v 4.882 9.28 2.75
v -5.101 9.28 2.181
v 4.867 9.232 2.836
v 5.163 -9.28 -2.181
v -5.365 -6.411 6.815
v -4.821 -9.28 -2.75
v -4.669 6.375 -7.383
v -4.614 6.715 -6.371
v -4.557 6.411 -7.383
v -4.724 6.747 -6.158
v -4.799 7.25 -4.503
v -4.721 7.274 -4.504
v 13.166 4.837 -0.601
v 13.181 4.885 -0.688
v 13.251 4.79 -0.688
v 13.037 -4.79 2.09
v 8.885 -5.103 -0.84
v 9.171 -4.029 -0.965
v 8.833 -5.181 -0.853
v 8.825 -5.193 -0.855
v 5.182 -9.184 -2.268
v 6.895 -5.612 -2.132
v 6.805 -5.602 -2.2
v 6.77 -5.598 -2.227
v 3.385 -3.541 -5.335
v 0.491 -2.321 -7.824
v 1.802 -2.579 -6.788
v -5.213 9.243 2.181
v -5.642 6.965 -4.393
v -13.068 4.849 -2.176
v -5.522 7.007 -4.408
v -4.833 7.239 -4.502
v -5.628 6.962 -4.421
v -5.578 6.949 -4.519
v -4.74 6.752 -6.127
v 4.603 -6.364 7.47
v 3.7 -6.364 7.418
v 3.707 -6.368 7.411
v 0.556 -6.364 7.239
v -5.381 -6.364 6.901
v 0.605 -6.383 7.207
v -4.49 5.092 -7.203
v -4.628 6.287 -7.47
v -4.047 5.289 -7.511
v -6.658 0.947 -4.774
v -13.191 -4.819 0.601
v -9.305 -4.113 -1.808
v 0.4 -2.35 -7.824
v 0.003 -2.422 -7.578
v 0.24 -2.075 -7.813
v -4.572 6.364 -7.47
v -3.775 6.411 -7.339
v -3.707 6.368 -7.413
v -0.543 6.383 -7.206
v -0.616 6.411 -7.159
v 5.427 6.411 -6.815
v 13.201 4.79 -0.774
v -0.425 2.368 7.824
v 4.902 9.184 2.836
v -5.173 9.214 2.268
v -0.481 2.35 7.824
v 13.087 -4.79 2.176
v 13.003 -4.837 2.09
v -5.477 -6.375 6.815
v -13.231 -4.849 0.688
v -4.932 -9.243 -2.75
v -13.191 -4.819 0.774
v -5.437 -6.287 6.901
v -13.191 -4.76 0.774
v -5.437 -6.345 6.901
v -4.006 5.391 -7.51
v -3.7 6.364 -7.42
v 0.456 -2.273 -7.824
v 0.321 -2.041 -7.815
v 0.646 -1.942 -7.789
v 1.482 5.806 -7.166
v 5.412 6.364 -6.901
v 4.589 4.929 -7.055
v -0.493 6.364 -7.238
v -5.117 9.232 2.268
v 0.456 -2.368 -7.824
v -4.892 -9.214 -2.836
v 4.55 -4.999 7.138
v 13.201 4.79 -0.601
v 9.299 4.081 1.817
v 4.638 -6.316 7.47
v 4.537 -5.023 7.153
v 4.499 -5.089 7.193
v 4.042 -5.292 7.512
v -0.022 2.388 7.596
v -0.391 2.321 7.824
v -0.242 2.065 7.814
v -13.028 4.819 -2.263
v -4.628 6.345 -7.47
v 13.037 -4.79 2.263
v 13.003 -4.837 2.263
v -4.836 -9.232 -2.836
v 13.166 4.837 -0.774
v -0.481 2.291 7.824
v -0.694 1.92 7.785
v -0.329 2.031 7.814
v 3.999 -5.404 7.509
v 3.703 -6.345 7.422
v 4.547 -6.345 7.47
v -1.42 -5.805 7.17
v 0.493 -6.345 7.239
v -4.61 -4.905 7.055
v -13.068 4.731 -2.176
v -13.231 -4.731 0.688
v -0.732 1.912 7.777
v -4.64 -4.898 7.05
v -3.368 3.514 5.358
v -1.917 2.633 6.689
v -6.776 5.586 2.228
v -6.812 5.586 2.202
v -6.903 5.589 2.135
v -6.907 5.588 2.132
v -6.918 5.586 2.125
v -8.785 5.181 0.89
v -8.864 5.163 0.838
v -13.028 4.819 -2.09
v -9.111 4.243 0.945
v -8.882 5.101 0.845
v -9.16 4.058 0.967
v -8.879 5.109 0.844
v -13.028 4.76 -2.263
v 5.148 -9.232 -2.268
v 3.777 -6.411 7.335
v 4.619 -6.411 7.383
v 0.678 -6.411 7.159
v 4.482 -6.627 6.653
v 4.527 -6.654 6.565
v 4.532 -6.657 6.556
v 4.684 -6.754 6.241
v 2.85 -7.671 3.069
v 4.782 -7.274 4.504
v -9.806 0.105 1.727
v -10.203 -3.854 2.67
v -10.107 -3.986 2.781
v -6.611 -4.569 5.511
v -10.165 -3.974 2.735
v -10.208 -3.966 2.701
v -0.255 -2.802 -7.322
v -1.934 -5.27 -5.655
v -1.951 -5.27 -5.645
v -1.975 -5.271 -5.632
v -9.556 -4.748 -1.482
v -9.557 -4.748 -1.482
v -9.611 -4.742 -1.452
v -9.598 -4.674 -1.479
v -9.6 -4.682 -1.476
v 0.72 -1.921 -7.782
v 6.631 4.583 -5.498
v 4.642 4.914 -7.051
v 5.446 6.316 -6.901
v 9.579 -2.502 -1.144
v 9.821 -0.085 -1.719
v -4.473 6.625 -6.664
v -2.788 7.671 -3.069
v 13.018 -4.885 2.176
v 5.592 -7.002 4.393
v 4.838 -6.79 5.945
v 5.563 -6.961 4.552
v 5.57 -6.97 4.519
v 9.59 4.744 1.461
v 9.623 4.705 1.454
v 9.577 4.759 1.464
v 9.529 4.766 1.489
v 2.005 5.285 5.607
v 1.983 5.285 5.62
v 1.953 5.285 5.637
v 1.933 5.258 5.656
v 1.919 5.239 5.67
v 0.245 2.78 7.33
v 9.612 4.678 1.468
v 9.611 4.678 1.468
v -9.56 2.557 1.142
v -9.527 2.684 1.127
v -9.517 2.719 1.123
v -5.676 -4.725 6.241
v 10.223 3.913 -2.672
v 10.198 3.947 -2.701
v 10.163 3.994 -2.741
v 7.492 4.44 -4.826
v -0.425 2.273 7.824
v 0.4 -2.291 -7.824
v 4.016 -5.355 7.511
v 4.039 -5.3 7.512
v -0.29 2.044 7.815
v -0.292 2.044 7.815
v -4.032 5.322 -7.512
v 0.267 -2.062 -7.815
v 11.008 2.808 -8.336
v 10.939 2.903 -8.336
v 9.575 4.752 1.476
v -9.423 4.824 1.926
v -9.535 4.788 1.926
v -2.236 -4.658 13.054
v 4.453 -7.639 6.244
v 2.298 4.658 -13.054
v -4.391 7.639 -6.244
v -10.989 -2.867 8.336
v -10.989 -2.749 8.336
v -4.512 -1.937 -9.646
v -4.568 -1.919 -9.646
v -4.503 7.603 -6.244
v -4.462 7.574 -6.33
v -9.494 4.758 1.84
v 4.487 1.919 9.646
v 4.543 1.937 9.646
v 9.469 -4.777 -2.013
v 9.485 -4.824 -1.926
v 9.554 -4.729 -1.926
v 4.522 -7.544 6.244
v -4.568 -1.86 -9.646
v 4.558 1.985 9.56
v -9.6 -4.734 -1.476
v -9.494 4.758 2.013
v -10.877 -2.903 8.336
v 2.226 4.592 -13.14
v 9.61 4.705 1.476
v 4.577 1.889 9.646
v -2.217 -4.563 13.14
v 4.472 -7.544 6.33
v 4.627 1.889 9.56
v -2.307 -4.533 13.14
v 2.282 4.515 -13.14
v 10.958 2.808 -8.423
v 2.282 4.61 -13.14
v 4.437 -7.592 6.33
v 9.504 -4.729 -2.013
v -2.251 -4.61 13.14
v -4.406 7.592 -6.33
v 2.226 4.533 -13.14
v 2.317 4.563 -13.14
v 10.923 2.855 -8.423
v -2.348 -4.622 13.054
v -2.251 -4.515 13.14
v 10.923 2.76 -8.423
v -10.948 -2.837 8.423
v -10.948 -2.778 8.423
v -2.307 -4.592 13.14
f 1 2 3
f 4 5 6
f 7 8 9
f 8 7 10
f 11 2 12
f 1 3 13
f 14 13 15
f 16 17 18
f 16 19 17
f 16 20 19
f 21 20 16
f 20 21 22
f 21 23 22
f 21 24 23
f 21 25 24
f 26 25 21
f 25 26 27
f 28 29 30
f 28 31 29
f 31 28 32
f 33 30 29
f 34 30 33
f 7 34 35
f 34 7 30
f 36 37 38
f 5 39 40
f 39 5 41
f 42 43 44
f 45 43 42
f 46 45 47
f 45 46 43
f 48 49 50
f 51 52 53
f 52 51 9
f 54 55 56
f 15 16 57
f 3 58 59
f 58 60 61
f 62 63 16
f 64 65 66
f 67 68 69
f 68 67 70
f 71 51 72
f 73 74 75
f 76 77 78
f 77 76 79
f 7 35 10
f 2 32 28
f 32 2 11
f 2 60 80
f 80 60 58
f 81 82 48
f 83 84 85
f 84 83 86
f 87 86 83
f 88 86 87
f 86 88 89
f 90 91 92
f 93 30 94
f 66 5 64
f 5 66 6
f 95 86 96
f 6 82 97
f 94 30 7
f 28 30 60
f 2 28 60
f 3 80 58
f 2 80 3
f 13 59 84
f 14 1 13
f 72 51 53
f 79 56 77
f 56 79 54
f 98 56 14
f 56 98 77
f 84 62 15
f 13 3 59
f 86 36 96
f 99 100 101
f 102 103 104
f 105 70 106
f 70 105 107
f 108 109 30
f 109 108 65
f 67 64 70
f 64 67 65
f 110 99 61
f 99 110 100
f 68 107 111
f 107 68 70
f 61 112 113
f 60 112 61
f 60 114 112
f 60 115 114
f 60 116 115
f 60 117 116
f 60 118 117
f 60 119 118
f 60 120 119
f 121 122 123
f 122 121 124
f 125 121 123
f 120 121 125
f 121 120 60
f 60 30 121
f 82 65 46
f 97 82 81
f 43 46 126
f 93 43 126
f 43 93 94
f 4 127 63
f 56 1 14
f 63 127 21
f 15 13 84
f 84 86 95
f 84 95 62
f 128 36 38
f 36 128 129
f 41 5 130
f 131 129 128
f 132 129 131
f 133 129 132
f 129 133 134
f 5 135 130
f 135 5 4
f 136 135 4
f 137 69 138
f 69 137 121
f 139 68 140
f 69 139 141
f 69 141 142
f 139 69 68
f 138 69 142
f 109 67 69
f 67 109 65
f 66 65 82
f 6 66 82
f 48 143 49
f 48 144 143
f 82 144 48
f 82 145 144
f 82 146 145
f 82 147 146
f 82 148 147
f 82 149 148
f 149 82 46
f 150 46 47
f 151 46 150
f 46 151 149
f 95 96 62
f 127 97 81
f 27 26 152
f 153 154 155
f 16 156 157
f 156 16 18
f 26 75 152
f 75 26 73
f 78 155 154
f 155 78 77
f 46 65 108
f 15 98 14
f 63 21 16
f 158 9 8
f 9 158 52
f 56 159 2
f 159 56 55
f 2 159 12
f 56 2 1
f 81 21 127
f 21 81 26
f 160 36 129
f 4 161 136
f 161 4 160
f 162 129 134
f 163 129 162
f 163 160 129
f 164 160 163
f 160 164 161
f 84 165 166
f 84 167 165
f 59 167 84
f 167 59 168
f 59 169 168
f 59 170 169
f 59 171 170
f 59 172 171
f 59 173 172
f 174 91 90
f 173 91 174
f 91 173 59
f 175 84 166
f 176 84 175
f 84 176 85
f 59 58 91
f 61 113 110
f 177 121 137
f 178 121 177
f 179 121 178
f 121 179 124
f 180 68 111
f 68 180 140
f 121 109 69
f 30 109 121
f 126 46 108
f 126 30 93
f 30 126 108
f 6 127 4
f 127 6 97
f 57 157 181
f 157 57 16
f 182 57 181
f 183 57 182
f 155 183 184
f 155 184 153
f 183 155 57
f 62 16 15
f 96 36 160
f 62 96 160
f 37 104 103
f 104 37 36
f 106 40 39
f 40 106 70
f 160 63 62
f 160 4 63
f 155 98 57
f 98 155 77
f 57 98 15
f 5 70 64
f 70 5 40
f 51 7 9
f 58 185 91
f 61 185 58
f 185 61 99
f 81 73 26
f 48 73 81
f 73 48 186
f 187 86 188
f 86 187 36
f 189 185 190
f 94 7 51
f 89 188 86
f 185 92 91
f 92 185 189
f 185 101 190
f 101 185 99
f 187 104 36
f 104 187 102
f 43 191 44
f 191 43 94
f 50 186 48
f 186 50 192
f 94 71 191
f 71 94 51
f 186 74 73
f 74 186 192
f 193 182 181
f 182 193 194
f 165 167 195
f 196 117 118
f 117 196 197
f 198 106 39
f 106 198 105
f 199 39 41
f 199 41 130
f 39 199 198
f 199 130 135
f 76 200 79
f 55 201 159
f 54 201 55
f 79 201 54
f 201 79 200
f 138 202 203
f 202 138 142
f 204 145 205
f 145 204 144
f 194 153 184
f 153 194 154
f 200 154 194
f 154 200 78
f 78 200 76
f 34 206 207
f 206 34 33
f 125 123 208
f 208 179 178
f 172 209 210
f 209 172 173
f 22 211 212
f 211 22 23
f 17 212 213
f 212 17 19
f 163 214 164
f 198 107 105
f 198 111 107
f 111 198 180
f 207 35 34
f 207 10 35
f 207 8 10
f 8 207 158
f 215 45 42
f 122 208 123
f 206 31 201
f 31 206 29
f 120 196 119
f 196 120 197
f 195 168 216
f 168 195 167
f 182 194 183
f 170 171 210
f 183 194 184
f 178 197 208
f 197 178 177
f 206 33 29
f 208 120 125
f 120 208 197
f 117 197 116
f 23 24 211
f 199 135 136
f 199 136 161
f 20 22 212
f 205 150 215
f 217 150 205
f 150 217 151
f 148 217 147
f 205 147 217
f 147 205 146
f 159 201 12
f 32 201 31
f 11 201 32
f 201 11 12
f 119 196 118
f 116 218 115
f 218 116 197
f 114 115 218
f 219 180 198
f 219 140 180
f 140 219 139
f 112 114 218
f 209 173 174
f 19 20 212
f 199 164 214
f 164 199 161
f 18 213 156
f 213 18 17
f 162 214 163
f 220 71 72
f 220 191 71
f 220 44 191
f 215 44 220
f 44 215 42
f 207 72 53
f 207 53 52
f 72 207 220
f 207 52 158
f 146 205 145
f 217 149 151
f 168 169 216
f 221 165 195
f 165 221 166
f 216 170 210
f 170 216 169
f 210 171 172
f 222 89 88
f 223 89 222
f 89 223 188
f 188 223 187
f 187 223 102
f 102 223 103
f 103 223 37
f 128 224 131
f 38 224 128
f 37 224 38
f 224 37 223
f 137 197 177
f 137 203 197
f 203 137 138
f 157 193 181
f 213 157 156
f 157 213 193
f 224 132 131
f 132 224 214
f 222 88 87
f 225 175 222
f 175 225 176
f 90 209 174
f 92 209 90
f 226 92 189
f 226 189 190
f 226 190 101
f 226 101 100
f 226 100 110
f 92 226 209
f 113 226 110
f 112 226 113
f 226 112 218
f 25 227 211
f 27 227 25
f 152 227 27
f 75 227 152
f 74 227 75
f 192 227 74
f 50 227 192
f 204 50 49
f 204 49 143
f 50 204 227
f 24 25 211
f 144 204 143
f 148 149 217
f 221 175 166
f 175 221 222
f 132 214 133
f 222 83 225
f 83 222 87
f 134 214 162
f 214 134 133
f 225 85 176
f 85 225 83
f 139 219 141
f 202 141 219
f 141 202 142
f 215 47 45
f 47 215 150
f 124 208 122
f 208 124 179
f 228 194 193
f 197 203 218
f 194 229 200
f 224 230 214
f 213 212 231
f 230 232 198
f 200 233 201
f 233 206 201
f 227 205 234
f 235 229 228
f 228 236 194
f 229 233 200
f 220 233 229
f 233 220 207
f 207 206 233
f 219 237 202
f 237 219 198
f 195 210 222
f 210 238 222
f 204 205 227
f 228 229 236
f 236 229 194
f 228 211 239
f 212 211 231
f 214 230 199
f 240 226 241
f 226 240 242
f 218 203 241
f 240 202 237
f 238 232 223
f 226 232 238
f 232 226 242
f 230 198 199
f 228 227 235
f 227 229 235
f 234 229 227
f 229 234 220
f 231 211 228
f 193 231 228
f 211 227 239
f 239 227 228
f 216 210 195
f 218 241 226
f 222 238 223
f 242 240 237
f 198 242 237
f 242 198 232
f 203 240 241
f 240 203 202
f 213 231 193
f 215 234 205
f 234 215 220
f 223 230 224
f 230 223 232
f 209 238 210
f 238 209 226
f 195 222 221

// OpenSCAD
// Auto-generated OpenSCAD file

    inner_points = 10*[[0.9453936894816409, -0.47289547434939777, -0.19263732612249004], [0.9559597690770948, 0.47047255319654285, 0.13894241174769978], [-0.4527324971708146, -0.18894257072883713, -0.9559510908824418], [-0.44216641757536057, 0.7544254568171036, -0.624371353012252], [0.44216641757536057, -0.7544254568171036, 0.624371353012252], [0.4527324971708146, 0.18894257072883713, 0.9559510908824418], [-0.9559597690770948, -0.47047255319654285, -0.13894241174769978], [-0.9453936894816409, 0.47289547434939777, 0.19263732612249004], [1.0907778029145119, 0.2807812586554431, -0.8336013201880601], [0.22668829900201493, 0.4562738042971726, -1.305355170890352], [-0.22668829900201493, -0.4562738042971726, 1.305355170890352], [-1.0907778029145119, -0.2807812586554431, 0.8336013201880601], [-0.008548137956640611, -0.7632007662346396, -0.2682536429273739], [0.008548137956640611, 0.7632007662346396, 0.2682536429273739]];

    outer_points = 10*[[0.513230909726221, -0.9184428339478712, -0.2180946841600515], [0.4587614600394385, -0.6315952925971899, 0.738331772537947], [0.5396207656457714, 0.6315952925971899, -0.6814728995641832], [0.485151315958989, 0.9184428339478712, 0.27495355713381525], [-0.485151315958989, -0.9184428339478712, -0.27495355713381525], [-0.5396207656457714, -0.6315952925971899, 0.6814728995641832], [-0.4587614600394385, 0.6315952925971899, -0.738331772537947], [-0.513230909726221, 0.9184428339478712, 0.2180946841600515], [1.2987443863455765, -0.47898812303152916, 0.21762097438667488], [1.3150542142620716, 0.47898812303152916, -0.06876251237934862], [-1.3150542142620716, -0.47898812303152916, 0.06876251237934862], [-1.2987443863455765, 0.47898812303152916, -0.21762097438667488], [0.04406671047085817, -0.23206453574737165, -0.7737652573384957], [-0.04406671047085817, 0.23206453574737165, 0.7737652573384957]];

    // Convex hull for inner set (I)
    module inner_hull() {
        hull() {
            for (p = inner_points) {
                translate(p) sphere(r=0.1);
            }
        }
    }

    // Convex hull for outer set (O) minus inner hull (O \ I)
    module outer_minus_inner() {
        difference() {
            hull() {
                for (p = outer_points) {
                    translate(p) sphere(r=0.1);
                }
            }
            inner_hull(); // Subtract inner hull
        }
    }

    // Convex hull for outer set (O) minus all translated inner hulls
    module outer_minus_AllTranslationInner() {
        difference() {
            hull() {
                for (p = outer_points) {
                    translate(p) sphere(r=0.1);
                }
            }
            hull() {
                translate([0,0,50]) inner_hull();
                translate([0,0,-50]) inner_hull();
            }; // Subtract translated inner hulls
        }
    }

    // Difference between outer_minus_inner and outer_minus_AllTranslationInner
    module outer_minus_inner_diff() {
        difference() {
            // Outer minus inner
            difference() {
                hull() {
                    for (p = outer_points) {
                        translate(p) sphere(r=0.1);
                    }
                }
                inner_hull();
            }

            // Subtract Outer minus AllTranslationInner
            difference() {
                hull() {
                    for (p = outer_points) {
                        translate(p) sphere(r=0.1);
                    }
                }
                hull() {
                    translate([0,0,50]) inner_hull();
                    translate([0,0,-50]) inner_hull();
                };
            }
        }
    }

    // Rendering all with colors applied
    color([1, 0, 0, 0.5]) inner_hull(); // Transparent red
    color([0, 1, 0, 1]) outer_minus_AllTranslationInner(); // Opaque green
    color([1, 1, 0, 1]) outer_minus_inner_diff(); // Opaque yellow
    
